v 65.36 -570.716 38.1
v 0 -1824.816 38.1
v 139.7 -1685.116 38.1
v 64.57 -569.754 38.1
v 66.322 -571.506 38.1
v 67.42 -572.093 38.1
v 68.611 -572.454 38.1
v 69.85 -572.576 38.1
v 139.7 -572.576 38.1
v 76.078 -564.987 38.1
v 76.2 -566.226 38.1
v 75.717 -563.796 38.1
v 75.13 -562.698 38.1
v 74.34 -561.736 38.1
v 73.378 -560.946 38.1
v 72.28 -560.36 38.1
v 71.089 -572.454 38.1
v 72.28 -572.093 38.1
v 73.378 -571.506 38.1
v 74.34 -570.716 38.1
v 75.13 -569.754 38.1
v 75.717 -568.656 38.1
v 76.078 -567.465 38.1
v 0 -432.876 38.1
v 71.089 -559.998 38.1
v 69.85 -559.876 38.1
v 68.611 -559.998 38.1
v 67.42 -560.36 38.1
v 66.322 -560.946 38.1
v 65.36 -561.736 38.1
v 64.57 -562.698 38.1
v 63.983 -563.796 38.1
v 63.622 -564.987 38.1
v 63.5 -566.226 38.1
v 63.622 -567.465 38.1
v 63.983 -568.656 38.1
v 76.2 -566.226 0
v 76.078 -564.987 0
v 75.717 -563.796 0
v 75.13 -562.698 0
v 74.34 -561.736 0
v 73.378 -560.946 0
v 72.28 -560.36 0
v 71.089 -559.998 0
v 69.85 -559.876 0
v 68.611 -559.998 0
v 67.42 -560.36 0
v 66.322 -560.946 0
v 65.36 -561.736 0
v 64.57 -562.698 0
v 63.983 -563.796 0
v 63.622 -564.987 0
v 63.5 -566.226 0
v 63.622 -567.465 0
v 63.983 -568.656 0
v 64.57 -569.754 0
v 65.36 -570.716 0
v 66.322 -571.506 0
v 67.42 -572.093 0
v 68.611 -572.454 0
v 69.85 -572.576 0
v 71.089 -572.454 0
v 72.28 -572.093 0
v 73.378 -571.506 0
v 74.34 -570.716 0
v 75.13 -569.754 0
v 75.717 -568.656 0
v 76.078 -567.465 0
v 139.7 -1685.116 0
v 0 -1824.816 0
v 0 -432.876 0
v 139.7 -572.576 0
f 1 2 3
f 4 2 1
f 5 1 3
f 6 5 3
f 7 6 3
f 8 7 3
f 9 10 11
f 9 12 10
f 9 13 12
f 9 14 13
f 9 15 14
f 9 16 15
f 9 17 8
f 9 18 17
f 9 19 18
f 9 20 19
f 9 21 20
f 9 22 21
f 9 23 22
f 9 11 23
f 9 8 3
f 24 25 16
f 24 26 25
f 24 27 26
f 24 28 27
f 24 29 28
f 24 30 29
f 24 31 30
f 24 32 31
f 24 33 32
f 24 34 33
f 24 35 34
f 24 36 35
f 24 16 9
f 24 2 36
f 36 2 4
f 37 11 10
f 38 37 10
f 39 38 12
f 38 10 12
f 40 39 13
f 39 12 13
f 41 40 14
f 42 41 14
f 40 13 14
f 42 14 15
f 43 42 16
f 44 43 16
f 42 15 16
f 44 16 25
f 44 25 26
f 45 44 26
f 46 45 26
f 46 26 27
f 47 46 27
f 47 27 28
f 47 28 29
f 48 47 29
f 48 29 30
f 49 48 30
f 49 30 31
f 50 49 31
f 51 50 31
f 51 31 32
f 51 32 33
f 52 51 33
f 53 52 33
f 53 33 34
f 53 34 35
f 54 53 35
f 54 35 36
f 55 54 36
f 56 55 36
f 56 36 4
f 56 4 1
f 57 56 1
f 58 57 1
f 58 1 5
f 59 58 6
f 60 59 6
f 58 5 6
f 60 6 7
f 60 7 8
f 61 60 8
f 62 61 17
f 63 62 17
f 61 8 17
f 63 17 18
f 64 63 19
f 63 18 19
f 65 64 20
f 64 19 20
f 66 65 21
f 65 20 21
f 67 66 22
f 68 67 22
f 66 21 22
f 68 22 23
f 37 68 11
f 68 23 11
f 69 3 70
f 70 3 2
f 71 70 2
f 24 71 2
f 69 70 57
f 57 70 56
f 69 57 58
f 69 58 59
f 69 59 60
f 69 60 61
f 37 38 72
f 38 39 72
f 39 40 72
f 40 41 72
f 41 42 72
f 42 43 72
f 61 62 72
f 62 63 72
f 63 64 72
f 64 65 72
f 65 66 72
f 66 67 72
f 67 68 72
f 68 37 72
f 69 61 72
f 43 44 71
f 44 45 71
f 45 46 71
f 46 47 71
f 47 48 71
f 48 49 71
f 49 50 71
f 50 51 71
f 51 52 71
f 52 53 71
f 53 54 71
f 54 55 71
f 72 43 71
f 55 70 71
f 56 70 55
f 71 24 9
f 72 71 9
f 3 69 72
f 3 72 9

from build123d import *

# Parameters (mm, degrees)
F0_W      = 139.7
F0_H      = 38.1
F1_DEPTH  = 1828.8
F3_W      = 331.3202857971
F3_H      = 260.5838701129
F4_DEPTH  = 101.6
F7_W      = 1553.4552037716
F7_H      = 1155.3529500961
F8_DEPTH  = 762
F9_R      = 6.35
F10_DEPTH = 38.101


with BuildPart() as f1:
    # F0 (on Front) → F1 (new body)
    with BuildSketch(Plane.XZ):
        with Locations((69.85, 19.05)):
            Rectangle(F0_W, F0_H)
    extrude(amount=F1_DEPTH)

    # F3 (on face) → F4 (cut)
    with BuildSketch(Plane(origin=(984.25, -984.25, 0), x_dir=(-0.7071067812, -0.7071067812, 0), z_dir=(-0.7071067812, 0.7071067812, 0))):
        with Locations((1222.6701974869, 7.0506222546)):
            Rectangle(F3_W, F3_H)
    extrude(amount=F4_DEPTH, mode=Mode.SUBTRACT)

    # F7 (on face) → F8 (cut)
    with BuildSketch(Plane(origin=(-216.4381016486, -216.4381016486, 0), x_dir=(0.7071067812, -0.7071067812, 0), z_dir=(-0.7071067812, -0.7071067812, 0))):
        with Locations((614.4417077303, -181.5140247345)):
            Rectangle(F7_W, F7_H)
    extrude(amount=-F8_DEPTH, mode=Mode.SUBTRACT)

    # F9 (on face) → F10 (cut, through all)
    with BuildSketch(Plane.XY.offset(38.1)):
        with Locations((69.85, -566.2262032972)):
            Circle(F9_R)
    extrude(amount=-F10_DEPTH, mode=Mode.SUBTRACT)


solid = f1.part
